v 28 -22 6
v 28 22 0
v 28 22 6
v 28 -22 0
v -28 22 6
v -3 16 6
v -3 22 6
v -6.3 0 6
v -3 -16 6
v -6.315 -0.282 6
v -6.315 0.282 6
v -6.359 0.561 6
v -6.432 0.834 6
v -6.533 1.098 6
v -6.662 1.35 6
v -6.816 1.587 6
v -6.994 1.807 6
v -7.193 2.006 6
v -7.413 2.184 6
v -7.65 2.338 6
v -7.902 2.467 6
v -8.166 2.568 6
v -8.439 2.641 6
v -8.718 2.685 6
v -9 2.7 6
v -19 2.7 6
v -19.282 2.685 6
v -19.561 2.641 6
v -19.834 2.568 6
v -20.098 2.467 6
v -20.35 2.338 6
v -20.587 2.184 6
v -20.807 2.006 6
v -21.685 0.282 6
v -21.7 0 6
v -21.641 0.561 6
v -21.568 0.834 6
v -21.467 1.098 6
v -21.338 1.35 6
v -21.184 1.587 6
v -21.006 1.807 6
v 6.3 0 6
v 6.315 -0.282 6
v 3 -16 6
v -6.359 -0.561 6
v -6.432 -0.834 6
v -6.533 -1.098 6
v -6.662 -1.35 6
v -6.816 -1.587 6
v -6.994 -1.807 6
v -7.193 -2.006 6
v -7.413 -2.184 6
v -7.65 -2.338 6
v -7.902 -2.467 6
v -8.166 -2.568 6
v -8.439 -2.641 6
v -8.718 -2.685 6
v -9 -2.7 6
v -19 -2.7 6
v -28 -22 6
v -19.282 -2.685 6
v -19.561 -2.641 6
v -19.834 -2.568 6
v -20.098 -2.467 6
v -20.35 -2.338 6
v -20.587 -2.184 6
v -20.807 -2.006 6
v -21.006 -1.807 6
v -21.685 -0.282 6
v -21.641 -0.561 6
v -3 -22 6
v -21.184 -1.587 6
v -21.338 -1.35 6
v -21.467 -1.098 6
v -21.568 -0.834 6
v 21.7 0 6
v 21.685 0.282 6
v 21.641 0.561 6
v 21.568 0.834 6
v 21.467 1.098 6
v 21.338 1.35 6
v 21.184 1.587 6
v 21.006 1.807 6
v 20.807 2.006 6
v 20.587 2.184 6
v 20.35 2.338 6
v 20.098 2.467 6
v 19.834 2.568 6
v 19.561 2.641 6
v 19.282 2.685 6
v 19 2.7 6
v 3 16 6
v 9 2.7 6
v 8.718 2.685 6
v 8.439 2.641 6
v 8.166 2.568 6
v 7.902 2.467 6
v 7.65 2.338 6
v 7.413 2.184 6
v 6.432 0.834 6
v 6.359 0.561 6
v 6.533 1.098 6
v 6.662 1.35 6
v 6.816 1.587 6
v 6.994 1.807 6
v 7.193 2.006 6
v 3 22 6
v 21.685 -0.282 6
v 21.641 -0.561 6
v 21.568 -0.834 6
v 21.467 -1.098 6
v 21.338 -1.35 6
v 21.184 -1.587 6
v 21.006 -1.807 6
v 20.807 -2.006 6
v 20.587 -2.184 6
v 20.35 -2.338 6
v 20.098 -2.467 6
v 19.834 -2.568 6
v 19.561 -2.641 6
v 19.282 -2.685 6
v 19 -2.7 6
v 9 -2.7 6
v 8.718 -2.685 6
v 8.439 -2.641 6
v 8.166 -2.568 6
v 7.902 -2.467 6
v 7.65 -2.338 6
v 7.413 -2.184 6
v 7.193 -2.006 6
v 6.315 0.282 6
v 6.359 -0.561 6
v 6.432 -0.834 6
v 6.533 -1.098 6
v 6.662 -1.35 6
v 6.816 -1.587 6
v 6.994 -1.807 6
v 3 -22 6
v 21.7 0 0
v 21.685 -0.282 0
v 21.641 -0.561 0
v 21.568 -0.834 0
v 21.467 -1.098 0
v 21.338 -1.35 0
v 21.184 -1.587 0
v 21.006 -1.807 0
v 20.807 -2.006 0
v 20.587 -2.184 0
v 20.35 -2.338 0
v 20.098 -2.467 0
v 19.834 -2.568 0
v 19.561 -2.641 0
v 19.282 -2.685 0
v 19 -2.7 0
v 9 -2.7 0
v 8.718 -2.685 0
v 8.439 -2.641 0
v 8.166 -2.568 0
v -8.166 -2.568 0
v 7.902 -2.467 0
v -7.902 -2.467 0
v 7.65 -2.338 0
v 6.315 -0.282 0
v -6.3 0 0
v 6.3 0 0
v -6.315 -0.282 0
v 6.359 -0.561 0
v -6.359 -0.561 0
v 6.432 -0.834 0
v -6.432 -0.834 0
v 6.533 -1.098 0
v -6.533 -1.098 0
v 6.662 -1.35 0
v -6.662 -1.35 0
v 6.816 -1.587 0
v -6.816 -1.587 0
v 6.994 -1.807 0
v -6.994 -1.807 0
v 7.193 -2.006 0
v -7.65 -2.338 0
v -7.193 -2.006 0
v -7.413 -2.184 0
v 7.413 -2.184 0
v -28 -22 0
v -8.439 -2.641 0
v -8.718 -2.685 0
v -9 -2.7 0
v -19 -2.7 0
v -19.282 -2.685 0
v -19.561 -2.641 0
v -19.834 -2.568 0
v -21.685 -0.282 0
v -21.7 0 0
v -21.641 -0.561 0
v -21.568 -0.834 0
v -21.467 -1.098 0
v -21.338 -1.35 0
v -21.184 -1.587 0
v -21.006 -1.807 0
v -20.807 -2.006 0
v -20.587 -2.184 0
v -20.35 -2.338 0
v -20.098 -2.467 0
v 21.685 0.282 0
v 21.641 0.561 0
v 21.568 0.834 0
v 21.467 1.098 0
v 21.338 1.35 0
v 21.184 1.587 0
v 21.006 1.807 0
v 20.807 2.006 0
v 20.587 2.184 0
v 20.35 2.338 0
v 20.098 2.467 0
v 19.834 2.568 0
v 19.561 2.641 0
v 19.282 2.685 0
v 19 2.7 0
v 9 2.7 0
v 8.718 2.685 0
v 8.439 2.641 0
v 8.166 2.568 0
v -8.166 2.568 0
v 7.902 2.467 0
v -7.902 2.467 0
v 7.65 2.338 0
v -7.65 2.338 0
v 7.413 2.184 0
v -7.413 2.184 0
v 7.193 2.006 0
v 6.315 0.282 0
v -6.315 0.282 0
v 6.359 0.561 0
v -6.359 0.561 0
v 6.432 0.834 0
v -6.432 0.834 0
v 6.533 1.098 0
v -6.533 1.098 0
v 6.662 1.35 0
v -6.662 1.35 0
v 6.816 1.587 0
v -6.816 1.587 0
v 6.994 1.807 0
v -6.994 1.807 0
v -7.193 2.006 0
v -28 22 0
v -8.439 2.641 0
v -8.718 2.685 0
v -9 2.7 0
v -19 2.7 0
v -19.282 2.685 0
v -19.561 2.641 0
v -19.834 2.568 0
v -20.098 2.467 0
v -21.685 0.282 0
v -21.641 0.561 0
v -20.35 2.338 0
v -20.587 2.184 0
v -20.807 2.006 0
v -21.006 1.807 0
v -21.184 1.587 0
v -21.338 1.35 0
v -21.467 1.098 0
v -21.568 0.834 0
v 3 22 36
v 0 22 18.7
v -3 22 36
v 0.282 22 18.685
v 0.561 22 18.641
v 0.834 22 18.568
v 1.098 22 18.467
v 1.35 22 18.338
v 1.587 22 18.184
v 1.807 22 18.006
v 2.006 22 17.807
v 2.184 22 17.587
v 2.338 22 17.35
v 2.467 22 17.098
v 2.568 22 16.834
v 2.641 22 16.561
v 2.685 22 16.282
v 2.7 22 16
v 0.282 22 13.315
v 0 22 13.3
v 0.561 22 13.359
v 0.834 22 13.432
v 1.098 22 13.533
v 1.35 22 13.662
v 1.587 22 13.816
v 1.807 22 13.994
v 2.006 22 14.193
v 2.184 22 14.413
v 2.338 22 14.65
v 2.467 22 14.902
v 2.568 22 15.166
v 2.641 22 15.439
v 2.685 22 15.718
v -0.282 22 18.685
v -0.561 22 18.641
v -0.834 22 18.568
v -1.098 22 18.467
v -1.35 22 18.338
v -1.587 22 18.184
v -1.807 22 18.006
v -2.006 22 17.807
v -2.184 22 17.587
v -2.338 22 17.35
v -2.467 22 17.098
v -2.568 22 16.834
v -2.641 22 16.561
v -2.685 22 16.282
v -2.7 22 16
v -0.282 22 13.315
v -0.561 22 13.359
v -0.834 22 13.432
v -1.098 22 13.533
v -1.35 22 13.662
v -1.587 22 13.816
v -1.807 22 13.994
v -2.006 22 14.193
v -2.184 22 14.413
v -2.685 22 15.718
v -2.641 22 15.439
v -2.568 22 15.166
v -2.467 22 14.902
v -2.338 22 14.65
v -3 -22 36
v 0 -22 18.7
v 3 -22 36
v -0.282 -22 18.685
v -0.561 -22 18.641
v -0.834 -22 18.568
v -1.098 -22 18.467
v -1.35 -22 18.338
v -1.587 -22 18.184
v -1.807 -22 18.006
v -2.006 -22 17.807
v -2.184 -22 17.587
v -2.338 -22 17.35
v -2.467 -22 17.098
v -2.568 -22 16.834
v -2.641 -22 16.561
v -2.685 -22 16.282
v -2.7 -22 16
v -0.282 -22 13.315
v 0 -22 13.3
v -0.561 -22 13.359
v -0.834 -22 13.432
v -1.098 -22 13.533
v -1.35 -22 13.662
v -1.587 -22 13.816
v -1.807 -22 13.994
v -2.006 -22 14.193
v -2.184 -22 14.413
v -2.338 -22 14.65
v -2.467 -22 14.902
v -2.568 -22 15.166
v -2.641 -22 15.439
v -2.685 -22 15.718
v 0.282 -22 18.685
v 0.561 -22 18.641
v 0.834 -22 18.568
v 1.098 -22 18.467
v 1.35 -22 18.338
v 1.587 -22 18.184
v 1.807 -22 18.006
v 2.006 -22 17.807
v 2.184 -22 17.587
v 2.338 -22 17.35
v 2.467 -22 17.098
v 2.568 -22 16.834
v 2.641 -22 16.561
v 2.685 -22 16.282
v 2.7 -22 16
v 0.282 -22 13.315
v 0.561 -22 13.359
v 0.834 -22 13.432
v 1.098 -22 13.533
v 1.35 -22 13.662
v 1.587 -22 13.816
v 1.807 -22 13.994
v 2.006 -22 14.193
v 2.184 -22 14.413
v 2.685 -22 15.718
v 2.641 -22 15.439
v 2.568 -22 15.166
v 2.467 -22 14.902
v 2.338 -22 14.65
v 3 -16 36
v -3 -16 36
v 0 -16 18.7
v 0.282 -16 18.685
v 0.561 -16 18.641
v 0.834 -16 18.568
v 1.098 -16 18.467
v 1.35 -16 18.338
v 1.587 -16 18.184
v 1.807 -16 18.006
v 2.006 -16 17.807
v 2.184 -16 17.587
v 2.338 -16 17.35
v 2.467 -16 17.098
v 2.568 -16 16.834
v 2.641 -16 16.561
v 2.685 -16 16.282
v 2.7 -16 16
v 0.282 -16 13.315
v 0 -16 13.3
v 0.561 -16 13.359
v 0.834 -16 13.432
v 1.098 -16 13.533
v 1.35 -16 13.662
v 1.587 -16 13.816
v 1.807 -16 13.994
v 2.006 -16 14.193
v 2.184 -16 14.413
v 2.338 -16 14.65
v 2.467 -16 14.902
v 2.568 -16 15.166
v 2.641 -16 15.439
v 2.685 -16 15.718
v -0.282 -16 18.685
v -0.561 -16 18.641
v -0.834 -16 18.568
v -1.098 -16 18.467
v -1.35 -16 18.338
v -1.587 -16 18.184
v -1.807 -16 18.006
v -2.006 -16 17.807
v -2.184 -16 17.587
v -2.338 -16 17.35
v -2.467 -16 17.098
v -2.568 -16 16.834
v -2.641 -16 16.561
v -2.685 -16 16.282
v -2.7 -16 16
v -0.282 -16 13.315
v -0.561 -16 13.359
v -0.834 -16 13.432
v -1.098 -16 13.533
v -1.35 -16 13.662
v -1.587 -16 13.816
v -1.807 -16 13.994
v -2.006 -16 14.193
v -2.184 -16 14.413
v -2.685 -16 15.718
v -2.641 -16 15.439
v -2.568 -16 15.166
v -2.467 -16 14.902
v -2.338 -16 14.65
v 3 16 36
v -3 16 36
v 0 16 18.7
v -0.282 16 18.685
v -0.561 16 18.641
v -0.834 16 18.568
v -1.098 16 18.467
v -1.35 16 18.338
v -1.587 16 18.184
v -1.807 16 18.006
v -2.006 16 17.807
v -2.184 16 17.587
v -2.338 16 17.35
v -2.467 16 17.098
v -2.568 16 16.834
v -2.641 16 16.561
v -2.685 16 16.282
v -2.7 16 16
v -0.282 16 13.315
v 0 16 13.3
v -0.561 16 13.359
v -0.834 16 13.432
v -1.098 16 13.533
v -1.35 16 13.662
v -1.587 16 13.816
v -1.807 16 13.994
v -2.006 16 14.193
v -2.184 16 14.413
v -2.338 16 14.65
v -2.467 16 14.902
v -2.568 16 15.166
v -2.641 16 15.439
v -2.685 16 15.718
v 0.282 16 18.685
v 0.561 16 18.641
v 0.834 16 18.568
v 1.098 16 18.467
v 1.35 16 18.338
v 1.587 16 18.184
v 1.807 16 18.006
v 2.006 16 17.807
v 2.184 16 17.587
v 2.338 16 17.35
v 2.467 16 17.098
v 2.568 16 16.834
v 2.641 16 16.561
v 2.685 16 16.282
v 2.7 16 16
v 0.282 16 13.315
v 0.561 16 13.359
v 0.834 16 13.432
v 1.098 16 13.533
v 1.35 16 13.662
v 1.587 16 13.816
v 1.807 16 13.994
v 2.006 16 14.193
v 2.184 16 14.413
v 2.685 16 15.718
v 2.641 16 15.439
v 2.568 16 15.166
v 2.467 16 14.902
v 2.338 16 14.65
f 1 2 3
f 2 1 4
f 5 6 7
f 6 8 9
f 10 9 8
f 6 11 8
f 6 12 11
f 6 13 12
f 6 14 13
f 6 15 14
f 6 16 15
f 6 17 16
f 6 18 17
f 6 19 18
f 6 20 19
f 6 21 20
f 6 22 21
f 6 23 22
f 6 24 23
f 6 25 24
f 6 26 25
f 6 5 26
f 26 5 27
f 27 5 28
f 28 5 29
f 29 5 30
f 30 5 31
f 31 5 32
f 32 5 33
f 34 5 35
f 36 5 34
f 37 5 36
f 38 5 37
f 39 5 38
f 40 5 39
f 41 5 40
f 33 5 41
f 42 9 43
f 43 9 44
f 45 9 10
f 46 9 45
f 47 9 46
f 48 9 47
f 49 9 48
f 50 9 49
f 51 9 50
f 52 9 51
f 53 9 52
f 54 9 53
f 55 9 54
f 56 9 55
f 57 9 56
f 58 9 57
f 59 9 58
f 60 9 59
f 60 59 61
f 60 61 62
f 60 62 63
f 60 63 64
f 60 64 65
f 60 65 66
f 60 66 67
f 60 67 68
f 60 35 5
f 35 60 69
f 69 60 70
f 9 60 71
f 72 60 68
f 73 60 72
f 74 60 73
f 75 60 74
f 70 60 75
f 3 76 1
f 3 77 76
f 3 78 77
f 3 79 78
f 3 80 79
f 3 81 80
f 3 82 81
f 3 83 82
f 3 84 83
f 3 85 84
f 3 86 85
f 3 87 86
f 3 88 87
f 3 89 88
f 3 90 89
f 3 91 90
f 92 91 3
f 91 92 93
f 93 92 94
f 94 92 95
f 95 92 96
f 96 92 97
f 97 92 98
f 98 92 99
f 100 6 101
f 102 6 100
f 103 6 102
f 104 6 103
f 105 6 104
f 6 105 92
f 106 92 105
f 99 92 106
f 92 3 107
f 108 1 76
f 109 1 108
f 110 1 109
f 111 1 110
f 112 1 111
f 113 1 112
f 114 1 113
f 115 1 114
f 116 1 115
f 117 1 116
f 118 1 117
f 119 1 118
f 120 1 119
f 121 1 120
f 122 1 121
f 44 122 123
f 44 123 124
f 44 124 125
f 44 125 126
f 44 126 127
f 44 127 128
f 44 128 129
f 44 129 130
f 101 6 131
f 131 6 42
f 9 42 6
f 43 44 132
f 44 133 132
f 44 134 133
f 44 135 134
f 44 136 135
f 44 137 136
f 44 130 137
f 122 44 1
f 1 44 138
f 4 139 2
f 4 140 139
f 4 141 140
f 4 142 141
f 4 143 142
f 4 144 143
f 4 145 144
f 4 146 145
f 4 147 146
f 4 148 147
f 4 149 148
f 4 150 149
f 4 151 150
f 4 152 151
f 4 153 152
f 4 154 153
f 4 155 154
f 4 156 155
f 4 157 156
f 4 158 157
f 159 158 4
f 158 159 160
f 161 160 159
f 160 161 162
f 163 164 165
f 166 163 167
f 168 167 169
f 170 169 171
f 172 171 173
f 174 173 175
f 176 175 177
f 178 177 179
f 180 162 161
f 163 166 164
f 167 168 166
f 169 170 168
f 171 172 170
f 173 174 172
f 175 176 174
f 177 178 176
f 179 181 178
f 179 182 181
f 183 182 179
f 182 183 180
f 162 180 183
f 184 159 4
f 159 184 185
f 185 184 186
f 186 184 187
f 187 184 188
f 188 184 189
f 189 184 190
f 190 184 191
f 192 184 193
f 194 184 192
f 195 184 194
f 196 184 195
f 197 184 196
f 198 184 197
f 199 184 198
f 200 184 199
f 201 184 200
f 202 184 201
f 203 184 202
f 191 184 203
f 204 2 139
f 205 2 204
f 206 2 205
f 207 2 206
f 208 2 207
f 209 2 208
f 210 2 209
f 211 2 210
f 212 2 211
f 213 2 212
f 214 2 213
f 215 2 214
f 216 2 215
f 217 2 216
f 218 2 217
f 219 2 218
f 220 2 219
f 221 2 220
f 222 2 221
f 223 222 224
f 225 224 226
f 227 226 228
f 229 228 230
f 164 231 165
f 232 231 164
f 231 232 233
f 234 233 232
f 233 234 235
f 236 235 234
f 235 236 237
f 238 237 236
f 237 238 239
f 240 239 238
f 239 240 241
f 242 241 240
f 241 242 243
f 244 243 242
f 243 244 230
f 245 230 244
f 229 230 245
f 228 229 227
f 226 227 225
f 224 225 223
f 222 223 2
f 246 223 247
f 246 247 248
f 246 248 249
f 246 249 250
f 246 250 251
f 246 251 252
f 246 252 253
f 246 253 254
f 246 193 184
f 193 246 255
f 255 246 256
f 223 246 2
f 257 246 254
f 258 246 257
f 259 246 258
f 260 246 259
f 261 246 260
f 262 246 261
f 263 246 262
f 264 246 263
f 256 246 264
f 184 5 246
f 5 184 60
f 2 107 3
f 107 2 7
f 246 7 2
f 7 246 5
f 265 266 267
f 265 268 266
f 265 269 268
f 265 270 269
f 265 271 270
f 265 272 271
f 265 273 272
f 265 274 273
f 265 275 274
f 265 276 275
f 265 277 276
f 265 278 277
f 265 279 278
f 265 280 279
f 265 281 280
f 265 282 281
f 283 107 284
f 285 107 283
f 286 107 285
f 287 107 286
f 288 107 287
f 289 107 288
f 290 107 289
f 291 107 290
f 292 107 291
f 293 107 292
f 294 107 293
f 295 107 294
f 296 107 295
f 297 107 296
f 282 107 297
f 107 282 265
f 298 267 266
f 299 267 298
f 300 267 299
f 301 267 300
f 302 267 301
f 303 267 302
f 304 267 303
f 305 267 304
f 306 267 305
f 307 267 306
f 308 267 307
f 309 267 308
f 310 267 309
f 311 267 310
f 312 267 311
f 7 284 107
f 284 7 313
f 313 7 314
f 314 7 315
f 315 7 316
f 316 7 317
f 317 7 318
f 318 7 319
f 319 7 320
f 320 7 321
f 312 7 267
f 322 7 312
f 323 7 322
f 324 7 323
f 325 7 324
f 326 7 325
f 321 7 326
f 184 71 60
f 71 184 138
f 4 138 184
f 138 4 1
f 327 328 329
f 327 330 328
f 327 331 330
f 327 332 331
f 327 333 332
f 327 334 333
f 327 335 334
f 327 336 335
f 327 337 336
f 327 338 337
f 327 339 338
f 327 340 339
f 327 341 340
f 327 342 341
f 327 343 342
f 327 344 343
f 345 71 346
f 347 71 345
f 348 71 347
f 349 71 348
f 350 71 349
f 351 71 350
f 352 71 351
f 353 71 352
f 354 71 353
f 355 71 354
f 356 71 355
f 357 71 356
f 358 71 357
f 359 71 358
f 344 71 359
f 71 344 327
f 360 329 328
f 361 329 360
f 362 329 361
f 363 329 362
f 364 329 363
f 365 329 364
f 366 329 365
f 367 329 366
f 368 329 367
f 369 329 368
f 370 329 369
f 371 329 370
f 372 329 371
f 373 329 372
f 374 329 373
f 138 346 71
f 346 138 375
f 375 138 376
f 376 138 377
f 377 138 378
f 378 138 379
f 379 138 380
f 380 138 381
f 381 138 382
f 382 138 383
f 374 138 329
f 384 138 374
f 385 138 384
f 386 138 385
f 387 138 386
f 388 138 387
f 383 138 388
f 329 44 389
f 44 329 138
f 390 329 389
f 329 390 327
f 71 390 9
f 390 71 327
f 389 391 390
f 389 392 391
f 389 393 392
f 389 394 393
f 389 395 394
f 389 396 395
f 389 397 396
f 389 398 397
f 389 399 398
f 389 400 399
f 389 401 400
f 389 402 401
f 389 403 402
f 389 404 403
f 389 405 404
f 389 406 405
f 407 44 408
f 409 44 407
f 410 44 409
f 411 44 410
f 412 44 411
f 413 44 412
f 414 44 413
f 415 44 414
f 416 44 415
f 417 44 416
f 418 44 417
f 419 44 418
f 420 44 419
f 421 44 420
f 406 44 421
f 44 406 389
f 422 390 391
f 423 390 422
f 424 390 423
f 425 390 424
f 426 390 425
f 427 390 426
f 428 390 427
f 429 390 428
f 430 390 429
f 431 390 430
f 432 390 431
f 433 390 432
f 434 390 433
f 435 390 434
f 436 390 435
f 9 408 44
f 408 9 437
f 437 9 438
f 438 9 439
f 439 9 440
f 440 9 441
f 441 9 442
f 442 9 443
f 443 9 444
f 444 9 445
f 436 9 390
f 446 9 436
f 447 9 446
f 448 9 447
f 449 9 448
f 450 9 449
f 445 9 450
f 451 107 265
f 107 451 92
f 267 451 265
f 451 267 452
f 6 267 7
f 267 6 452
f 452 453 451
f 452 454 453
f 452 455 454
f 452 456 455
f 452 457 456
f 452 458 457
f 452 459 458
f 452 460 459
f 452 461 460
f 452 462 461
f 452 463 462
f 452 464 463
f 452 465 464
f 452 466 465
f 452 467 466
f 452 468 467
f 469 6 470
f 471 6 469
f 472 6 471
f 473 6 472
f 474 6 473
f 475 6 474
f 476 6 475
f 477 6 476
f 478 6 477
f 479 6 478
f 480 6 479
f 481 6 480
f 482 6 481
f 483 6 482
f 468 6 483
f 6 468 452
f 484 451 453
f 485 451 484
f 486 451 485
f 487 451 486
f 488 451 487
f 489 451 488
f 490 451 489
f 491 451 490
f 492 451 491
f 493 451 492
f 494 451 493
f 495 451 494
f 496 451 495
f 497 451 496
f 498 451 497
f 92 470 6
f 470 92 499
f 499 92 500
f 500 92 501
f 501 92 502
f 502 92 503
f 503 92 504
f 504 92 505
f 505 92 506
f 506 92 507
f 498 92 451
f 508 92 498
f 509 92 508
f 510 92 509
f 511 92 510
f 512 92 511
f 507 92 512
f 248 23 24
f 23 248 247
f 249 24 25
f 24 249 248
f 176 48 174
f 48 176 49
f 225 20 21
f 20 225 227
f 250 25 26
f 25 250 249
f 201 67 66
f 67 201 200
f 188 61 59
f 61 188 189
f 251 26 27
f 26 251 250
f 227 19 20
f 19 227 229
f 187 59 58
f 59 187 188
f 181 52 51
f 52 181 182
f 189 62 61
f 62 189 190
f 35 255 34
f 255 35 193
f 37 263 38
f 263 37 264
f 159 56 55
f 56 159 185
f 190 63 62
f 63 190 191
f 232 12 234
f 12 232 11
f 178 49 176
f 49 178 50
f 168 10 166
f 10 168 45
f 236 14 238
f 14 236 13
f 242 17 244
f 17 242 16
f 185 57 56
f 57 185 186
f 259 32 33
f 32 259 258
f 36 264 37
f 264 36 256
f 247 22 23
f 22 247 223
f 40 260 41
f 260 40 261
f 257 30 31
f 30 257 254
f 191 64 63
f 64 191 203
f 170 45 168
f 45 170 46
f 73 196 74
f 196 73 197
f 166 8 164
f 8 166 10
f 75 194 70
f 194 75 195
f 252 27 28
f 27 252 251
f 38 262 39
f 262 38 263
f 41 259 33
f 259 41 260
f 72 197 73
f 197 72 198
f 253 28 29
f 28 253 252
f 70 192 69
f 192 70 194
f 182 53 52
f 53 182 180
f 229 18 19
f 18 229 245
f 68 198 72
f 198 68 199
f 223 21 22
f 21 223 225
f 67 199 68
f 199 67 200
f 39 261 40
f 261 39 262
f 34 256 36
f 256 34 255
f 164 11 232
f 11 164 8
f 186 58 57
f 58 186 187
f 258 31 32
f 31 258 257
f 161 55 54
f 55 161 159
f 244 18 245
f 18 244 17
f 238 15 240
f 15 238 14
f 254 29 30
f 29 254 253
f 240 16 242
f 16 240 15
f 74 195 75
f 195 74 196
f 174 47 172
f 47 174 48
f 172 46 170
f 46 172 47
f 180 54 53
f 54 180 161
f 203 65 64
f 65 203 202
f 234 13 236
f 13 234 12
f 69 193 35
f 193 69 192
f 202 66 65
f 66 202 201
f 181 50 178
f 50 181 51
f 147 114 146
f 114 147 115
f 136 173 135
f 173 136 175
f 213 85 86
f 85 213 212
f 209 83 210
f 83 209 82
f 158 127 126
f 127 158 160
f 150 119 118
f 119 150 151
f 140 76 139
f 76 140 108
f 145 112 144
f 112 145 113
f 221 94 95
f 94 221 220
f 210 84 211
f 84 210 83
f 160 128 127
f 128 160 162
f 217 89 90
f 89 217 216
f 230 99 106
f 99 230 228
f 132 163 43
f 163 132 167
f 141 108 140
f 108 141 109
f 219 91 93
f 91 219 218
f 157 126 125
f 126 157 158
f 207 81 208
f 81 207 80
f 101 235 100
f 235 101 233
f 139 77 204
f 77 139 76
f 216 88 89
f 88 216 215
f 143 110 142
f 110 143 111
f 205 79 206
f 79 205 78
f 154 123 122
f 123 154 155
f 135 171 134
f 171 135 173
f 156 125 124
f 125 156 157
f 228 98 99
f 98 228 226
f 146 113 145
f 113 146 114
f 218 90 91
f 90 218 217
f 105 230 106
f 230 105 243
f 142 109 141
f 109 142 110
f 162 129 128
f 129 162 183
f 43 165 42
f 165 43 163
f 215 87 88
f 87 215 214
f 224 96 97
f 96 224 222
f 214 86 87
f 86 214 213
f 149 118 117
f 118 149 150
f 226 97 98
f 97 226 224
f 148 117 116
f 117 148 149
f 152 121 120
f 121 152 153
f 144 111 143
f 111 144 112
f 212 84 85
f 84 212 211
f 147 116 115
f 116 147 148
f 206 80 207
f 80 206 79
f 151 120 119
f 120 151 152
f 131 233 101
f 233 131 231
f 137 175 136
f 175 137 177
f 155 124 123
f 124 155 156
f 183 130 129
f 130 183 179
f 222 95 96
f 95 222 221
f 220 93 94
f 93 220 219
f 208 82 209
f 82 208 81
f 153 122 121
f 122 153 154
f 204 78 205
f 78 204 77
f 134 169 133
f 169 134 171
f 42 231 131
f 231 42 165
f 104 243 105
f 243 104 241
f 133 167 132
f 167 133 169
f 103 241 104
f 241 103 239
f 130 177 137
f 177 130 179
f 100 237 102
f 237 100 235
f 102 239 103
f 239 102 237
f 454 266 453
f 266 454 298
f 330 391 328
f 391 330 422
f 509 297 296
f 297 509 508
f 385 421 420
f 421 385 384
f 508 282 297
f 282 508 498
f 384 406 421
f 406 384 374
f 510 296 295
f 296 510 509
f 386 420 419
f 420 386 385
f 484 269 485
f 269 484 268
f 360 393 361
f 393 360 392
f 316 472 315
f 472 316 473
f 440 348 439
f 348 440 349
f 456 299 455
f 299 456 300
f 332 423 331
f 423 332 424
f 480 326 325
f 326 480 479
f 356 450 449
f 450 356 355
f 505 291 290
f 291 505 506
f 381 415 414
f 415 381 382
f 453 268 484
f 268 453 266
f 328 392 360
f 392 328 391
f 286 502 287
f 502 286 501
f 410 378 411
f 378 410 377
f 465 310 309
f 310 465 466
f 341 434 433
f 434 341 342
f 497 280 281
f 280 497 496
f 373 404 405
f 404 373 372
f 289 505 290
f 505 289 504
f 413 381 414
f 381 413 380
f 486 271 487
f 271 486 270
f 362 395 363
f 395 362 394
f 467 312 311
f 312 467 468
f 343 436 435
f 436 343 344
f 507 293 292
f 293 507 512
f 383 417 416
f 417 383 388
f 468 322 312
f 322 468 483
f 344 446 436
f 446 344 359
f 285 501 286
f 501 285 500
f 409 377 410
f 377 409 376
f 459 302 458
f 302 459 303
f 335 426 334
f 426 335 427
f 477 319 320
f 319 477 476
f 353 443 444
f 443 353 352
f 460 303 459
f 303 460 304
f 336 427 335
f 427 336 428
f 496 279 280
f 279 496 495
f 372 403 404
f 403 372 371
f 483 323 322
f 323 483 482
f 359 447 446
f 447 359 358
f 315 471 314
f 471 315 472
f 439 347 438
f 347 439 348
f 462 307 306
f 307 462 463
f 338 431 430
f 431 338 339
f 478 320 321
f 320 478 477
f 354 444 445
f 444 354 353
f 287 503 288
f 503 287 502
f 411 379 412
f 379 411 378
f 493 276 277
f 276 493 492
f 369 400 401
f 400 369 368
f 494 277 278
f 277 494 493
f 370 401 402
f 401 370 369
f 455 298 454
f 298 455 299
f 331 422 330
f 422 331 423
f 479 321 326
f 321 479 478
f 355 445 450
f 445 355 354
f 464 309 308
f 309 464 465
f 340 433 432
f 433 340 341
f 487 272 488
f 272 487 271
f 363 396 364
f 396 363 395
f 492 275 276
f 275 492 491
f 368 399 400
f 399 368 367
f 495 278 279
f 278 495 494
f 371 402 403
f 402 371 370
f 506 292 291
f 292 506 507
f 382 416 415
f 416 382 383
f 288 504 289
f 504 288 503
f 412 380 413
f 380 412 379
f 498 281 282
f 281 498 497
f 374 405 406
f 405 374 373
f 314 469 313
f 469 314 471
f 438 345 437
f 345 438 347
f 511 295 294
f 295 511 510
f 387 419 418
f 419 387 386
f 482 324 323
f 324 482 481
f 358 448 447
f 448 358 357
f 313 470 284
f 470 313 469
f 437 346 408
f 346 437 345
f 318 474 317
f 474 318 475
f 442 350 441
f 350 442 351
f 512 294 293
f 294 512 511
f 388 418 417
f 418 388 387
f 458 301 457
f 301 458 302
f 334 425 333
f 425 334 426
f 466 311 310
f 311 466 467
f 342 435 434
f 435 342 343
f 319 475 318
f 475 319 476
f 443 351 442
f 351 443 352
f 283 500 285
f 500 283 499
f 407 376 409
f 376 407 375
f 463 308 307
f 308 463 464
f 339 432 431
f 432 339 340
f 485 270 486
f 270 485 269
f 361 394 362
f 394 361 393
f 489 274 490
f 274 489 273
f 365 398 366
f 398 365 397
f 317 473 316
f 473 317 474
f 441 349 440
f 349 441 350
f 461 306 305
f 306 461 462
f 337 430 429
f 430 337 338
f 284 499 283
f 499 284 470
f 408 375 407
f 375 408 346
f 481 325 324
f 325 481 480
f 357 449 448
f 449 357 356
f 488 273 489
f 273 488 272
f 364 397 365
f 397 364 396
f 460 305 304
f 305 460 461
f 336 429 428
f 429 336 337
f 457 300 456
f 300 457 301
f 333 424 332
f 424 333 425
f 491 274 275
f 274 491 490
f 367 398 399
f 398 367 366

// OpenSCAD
// U pivot bracket, 32 mm opening.
$fn = 60;
eps = 0.02;
base_l = 56;
base_w = 44;
base_t = 6;
ear_t = 6;
ear_h = 32;
pivot_d = 5.4;
module mount(x) {
    hull() {
        translate([x - 5, 0, -eps]) cylinder(d = 5.4, h = base_t + 2 * eps);
        translate([x + 5, 0, -eps]) cylinder(d = 5.4, h = base_t + 2 * eps);
    }
}
difference() {
    union() {
        translate([-base_l / 2, -base_w / 2, 0]) cube([base_l, base_w, base_t]);
        translate([-ear_t / 2, -base_w / 2, base_t - 2]) cube([ear_t, ear_t, ear_h]);
        translate([-ear_t / 2, base_w / 2 - ear_t, base_t - 2]) cube([ear_t, ear_t, ear_h]);
    }
    mount(-14); mount(14);
    translate([0, -base_w / 2 - eps, ear_h / 2]) rotate([-90, 0, 0]) cylinder(d = pivot_d, h = base_w + 2 * eps);
}
